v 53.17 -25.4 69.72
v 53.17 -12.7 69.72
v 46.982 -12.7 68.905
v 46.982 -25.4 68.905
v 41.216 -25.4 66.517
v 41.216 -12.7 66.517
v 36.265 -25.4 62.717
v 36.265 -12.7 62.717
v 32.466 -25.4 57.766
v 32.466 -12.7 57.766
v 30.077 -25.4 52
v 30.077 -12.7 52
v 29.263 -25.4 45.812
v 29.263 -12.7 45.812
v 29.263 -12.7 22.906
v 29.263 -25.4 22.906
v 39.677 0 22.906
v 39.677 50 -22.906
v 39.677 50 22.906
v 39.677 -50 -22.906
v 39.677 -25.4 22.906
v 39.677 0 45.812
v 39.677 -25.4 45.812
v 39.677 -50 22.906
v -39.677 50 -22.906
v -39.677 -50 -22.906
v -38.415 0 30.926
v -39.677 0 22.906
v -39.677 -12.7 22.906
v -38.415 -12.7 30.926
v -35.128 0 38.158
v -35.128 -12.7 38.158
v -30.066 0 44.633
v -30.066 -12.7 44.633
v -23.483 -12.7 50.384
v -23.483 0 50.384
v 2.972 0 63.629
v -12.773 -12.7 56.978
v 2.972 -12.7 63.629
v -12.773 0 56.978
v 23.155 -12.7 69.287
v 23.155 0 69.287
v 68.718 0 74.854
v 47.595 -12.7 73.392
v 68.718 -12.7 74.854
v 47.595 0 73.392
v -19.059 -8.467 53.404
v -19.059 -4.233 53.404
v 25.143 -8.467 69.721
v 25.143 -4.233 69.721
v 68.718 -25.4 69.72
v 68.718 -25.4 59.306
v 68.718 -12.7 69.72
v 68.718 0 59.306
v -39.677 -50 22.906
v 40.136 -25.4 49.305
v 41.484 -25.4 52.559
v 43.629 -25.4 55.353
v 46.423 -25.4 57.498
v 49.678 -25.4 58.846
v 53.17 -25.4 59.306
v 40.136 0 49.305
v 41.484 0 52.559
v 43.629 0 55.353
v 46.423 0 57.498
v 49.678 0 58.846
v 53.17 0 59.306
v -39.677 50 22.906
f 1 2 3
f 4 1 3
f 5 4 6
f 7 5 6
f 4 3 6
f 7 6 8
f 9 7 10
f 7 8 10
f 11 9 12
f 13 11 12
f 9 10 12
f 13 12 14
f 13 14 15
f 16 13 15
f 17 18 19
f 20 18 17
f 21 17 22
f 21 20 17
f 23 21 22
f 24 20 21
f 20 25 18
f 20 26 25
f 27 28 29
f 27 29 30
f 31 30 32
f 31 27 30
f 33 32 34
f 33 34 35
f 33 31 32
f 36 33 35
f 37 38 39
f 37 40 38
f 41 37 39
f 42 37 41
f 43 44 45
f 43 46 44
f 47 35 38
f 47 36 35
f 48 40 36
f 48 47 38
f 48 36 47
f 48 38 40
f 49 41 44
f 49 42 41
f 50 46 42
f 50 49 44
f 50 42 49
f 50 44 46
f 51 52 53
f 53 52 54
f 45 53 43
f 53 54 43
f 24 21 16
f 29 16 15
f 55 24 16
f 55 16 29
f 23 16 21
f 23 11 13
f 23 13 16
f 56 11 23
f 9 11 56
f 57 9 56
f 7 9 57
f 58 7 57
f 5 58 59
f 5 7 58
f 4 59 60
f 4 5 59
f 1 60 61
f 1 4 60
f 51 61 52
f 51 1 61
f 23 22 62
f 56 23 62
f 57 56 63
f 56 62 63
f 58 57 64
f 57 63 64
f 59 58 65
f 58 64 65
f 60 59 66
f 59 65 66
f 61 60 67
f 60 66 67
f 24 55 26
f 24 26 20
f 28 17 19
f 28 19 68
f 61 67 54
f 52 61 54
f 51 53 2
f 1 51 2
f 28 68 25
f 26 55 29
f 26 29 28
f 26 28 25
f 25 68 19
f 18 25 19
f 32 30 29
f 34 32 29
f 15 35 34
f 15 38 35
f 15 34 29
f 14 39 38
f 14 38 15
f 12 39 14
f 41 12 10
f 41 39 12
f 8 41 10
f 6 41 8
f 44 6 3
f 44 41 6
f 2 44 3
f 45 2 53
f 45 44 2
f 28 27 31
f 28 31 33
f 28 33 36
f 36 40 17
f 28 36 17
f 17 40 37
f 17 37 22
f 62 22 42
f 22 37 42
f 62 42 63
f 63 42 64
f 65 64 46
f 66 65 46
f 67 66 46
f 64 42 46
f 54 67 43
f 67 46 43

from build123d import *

# Parameters (mm, degrees)
F1_DEPTH = 50
F2_DEPTH = 25.4
F3_DEPTH = 12.7


with BuildPart() as f1:
    # F0 (on Front) → F1 (new body, symmetric)
    with BuildSketch(Plane.XZ):
        Polygon((39.676692, -22.906134), (39.676692, 22.906134), (29.262691, 22.906134), (-39.676692, 22.906134), (-39.676692, -22.906134), align=None)
    extrude(amount=F1_DEPTH, both=True)

    # F0 (on Front) → F2 (join)
    with BuildSketch(Plane.XZ):
        with BuildLine():
            Line((29.262691, 22.906134), (39.676692, 22.906134))
            Line((39.676692, 22.906134), (39.676692, 45.812268))
            ThreePointArc((39.676692, 45.812268), (43.628779, 55.35345), (53.169962, 59.305537))
            Line((53.169962, 59.305537), (68.718389, 59.305537))
            Line((68.718389, 59.305537), (68.718389, 69.719538))
            Line((68.718389, 69.719538), (53.169962, 69.719538))
            ThreePointArc((53.169962, 69.719538), (36.264969, 62.717261), (29.262691, 45.812268))
            Line((29.262691, 45.812268), (29.262691, 22.906134))
        make_face()
    extrude(amount=F2_DEPTH)

    # F0 (on Front) → F3 (join)
    with BuildSketch(Plane.XZ):
        with BuildLine():
            Line((-39.676692, 22.906134), (29.262691, 22.906134))
            Line((29.262691, 22.906134), (29.262691, 45.812268))
            ThreePointArc((29.262691, 45.812268), (36.264969, 62.717261), (53.169962, 69.719538))
            Line((53.169962, 69.719538), (68.718389, 69.719538))
            Line((68.718389, 69.719538), (68.718389, 74.853972))
            add(Edge.make_bspline(
                [(-39.676692, 22.906134), (-38.920954, 61.494272), (33.526827, 74.314252), (68.718389, 74.853972)],
                knots=[0, 0, 0, 0, 120.200131, 120.200131, 120.200131, 120.200131], degree=3))
        make_face()
    extrude(amount=F3_DEPTH)


solid = f1.part
